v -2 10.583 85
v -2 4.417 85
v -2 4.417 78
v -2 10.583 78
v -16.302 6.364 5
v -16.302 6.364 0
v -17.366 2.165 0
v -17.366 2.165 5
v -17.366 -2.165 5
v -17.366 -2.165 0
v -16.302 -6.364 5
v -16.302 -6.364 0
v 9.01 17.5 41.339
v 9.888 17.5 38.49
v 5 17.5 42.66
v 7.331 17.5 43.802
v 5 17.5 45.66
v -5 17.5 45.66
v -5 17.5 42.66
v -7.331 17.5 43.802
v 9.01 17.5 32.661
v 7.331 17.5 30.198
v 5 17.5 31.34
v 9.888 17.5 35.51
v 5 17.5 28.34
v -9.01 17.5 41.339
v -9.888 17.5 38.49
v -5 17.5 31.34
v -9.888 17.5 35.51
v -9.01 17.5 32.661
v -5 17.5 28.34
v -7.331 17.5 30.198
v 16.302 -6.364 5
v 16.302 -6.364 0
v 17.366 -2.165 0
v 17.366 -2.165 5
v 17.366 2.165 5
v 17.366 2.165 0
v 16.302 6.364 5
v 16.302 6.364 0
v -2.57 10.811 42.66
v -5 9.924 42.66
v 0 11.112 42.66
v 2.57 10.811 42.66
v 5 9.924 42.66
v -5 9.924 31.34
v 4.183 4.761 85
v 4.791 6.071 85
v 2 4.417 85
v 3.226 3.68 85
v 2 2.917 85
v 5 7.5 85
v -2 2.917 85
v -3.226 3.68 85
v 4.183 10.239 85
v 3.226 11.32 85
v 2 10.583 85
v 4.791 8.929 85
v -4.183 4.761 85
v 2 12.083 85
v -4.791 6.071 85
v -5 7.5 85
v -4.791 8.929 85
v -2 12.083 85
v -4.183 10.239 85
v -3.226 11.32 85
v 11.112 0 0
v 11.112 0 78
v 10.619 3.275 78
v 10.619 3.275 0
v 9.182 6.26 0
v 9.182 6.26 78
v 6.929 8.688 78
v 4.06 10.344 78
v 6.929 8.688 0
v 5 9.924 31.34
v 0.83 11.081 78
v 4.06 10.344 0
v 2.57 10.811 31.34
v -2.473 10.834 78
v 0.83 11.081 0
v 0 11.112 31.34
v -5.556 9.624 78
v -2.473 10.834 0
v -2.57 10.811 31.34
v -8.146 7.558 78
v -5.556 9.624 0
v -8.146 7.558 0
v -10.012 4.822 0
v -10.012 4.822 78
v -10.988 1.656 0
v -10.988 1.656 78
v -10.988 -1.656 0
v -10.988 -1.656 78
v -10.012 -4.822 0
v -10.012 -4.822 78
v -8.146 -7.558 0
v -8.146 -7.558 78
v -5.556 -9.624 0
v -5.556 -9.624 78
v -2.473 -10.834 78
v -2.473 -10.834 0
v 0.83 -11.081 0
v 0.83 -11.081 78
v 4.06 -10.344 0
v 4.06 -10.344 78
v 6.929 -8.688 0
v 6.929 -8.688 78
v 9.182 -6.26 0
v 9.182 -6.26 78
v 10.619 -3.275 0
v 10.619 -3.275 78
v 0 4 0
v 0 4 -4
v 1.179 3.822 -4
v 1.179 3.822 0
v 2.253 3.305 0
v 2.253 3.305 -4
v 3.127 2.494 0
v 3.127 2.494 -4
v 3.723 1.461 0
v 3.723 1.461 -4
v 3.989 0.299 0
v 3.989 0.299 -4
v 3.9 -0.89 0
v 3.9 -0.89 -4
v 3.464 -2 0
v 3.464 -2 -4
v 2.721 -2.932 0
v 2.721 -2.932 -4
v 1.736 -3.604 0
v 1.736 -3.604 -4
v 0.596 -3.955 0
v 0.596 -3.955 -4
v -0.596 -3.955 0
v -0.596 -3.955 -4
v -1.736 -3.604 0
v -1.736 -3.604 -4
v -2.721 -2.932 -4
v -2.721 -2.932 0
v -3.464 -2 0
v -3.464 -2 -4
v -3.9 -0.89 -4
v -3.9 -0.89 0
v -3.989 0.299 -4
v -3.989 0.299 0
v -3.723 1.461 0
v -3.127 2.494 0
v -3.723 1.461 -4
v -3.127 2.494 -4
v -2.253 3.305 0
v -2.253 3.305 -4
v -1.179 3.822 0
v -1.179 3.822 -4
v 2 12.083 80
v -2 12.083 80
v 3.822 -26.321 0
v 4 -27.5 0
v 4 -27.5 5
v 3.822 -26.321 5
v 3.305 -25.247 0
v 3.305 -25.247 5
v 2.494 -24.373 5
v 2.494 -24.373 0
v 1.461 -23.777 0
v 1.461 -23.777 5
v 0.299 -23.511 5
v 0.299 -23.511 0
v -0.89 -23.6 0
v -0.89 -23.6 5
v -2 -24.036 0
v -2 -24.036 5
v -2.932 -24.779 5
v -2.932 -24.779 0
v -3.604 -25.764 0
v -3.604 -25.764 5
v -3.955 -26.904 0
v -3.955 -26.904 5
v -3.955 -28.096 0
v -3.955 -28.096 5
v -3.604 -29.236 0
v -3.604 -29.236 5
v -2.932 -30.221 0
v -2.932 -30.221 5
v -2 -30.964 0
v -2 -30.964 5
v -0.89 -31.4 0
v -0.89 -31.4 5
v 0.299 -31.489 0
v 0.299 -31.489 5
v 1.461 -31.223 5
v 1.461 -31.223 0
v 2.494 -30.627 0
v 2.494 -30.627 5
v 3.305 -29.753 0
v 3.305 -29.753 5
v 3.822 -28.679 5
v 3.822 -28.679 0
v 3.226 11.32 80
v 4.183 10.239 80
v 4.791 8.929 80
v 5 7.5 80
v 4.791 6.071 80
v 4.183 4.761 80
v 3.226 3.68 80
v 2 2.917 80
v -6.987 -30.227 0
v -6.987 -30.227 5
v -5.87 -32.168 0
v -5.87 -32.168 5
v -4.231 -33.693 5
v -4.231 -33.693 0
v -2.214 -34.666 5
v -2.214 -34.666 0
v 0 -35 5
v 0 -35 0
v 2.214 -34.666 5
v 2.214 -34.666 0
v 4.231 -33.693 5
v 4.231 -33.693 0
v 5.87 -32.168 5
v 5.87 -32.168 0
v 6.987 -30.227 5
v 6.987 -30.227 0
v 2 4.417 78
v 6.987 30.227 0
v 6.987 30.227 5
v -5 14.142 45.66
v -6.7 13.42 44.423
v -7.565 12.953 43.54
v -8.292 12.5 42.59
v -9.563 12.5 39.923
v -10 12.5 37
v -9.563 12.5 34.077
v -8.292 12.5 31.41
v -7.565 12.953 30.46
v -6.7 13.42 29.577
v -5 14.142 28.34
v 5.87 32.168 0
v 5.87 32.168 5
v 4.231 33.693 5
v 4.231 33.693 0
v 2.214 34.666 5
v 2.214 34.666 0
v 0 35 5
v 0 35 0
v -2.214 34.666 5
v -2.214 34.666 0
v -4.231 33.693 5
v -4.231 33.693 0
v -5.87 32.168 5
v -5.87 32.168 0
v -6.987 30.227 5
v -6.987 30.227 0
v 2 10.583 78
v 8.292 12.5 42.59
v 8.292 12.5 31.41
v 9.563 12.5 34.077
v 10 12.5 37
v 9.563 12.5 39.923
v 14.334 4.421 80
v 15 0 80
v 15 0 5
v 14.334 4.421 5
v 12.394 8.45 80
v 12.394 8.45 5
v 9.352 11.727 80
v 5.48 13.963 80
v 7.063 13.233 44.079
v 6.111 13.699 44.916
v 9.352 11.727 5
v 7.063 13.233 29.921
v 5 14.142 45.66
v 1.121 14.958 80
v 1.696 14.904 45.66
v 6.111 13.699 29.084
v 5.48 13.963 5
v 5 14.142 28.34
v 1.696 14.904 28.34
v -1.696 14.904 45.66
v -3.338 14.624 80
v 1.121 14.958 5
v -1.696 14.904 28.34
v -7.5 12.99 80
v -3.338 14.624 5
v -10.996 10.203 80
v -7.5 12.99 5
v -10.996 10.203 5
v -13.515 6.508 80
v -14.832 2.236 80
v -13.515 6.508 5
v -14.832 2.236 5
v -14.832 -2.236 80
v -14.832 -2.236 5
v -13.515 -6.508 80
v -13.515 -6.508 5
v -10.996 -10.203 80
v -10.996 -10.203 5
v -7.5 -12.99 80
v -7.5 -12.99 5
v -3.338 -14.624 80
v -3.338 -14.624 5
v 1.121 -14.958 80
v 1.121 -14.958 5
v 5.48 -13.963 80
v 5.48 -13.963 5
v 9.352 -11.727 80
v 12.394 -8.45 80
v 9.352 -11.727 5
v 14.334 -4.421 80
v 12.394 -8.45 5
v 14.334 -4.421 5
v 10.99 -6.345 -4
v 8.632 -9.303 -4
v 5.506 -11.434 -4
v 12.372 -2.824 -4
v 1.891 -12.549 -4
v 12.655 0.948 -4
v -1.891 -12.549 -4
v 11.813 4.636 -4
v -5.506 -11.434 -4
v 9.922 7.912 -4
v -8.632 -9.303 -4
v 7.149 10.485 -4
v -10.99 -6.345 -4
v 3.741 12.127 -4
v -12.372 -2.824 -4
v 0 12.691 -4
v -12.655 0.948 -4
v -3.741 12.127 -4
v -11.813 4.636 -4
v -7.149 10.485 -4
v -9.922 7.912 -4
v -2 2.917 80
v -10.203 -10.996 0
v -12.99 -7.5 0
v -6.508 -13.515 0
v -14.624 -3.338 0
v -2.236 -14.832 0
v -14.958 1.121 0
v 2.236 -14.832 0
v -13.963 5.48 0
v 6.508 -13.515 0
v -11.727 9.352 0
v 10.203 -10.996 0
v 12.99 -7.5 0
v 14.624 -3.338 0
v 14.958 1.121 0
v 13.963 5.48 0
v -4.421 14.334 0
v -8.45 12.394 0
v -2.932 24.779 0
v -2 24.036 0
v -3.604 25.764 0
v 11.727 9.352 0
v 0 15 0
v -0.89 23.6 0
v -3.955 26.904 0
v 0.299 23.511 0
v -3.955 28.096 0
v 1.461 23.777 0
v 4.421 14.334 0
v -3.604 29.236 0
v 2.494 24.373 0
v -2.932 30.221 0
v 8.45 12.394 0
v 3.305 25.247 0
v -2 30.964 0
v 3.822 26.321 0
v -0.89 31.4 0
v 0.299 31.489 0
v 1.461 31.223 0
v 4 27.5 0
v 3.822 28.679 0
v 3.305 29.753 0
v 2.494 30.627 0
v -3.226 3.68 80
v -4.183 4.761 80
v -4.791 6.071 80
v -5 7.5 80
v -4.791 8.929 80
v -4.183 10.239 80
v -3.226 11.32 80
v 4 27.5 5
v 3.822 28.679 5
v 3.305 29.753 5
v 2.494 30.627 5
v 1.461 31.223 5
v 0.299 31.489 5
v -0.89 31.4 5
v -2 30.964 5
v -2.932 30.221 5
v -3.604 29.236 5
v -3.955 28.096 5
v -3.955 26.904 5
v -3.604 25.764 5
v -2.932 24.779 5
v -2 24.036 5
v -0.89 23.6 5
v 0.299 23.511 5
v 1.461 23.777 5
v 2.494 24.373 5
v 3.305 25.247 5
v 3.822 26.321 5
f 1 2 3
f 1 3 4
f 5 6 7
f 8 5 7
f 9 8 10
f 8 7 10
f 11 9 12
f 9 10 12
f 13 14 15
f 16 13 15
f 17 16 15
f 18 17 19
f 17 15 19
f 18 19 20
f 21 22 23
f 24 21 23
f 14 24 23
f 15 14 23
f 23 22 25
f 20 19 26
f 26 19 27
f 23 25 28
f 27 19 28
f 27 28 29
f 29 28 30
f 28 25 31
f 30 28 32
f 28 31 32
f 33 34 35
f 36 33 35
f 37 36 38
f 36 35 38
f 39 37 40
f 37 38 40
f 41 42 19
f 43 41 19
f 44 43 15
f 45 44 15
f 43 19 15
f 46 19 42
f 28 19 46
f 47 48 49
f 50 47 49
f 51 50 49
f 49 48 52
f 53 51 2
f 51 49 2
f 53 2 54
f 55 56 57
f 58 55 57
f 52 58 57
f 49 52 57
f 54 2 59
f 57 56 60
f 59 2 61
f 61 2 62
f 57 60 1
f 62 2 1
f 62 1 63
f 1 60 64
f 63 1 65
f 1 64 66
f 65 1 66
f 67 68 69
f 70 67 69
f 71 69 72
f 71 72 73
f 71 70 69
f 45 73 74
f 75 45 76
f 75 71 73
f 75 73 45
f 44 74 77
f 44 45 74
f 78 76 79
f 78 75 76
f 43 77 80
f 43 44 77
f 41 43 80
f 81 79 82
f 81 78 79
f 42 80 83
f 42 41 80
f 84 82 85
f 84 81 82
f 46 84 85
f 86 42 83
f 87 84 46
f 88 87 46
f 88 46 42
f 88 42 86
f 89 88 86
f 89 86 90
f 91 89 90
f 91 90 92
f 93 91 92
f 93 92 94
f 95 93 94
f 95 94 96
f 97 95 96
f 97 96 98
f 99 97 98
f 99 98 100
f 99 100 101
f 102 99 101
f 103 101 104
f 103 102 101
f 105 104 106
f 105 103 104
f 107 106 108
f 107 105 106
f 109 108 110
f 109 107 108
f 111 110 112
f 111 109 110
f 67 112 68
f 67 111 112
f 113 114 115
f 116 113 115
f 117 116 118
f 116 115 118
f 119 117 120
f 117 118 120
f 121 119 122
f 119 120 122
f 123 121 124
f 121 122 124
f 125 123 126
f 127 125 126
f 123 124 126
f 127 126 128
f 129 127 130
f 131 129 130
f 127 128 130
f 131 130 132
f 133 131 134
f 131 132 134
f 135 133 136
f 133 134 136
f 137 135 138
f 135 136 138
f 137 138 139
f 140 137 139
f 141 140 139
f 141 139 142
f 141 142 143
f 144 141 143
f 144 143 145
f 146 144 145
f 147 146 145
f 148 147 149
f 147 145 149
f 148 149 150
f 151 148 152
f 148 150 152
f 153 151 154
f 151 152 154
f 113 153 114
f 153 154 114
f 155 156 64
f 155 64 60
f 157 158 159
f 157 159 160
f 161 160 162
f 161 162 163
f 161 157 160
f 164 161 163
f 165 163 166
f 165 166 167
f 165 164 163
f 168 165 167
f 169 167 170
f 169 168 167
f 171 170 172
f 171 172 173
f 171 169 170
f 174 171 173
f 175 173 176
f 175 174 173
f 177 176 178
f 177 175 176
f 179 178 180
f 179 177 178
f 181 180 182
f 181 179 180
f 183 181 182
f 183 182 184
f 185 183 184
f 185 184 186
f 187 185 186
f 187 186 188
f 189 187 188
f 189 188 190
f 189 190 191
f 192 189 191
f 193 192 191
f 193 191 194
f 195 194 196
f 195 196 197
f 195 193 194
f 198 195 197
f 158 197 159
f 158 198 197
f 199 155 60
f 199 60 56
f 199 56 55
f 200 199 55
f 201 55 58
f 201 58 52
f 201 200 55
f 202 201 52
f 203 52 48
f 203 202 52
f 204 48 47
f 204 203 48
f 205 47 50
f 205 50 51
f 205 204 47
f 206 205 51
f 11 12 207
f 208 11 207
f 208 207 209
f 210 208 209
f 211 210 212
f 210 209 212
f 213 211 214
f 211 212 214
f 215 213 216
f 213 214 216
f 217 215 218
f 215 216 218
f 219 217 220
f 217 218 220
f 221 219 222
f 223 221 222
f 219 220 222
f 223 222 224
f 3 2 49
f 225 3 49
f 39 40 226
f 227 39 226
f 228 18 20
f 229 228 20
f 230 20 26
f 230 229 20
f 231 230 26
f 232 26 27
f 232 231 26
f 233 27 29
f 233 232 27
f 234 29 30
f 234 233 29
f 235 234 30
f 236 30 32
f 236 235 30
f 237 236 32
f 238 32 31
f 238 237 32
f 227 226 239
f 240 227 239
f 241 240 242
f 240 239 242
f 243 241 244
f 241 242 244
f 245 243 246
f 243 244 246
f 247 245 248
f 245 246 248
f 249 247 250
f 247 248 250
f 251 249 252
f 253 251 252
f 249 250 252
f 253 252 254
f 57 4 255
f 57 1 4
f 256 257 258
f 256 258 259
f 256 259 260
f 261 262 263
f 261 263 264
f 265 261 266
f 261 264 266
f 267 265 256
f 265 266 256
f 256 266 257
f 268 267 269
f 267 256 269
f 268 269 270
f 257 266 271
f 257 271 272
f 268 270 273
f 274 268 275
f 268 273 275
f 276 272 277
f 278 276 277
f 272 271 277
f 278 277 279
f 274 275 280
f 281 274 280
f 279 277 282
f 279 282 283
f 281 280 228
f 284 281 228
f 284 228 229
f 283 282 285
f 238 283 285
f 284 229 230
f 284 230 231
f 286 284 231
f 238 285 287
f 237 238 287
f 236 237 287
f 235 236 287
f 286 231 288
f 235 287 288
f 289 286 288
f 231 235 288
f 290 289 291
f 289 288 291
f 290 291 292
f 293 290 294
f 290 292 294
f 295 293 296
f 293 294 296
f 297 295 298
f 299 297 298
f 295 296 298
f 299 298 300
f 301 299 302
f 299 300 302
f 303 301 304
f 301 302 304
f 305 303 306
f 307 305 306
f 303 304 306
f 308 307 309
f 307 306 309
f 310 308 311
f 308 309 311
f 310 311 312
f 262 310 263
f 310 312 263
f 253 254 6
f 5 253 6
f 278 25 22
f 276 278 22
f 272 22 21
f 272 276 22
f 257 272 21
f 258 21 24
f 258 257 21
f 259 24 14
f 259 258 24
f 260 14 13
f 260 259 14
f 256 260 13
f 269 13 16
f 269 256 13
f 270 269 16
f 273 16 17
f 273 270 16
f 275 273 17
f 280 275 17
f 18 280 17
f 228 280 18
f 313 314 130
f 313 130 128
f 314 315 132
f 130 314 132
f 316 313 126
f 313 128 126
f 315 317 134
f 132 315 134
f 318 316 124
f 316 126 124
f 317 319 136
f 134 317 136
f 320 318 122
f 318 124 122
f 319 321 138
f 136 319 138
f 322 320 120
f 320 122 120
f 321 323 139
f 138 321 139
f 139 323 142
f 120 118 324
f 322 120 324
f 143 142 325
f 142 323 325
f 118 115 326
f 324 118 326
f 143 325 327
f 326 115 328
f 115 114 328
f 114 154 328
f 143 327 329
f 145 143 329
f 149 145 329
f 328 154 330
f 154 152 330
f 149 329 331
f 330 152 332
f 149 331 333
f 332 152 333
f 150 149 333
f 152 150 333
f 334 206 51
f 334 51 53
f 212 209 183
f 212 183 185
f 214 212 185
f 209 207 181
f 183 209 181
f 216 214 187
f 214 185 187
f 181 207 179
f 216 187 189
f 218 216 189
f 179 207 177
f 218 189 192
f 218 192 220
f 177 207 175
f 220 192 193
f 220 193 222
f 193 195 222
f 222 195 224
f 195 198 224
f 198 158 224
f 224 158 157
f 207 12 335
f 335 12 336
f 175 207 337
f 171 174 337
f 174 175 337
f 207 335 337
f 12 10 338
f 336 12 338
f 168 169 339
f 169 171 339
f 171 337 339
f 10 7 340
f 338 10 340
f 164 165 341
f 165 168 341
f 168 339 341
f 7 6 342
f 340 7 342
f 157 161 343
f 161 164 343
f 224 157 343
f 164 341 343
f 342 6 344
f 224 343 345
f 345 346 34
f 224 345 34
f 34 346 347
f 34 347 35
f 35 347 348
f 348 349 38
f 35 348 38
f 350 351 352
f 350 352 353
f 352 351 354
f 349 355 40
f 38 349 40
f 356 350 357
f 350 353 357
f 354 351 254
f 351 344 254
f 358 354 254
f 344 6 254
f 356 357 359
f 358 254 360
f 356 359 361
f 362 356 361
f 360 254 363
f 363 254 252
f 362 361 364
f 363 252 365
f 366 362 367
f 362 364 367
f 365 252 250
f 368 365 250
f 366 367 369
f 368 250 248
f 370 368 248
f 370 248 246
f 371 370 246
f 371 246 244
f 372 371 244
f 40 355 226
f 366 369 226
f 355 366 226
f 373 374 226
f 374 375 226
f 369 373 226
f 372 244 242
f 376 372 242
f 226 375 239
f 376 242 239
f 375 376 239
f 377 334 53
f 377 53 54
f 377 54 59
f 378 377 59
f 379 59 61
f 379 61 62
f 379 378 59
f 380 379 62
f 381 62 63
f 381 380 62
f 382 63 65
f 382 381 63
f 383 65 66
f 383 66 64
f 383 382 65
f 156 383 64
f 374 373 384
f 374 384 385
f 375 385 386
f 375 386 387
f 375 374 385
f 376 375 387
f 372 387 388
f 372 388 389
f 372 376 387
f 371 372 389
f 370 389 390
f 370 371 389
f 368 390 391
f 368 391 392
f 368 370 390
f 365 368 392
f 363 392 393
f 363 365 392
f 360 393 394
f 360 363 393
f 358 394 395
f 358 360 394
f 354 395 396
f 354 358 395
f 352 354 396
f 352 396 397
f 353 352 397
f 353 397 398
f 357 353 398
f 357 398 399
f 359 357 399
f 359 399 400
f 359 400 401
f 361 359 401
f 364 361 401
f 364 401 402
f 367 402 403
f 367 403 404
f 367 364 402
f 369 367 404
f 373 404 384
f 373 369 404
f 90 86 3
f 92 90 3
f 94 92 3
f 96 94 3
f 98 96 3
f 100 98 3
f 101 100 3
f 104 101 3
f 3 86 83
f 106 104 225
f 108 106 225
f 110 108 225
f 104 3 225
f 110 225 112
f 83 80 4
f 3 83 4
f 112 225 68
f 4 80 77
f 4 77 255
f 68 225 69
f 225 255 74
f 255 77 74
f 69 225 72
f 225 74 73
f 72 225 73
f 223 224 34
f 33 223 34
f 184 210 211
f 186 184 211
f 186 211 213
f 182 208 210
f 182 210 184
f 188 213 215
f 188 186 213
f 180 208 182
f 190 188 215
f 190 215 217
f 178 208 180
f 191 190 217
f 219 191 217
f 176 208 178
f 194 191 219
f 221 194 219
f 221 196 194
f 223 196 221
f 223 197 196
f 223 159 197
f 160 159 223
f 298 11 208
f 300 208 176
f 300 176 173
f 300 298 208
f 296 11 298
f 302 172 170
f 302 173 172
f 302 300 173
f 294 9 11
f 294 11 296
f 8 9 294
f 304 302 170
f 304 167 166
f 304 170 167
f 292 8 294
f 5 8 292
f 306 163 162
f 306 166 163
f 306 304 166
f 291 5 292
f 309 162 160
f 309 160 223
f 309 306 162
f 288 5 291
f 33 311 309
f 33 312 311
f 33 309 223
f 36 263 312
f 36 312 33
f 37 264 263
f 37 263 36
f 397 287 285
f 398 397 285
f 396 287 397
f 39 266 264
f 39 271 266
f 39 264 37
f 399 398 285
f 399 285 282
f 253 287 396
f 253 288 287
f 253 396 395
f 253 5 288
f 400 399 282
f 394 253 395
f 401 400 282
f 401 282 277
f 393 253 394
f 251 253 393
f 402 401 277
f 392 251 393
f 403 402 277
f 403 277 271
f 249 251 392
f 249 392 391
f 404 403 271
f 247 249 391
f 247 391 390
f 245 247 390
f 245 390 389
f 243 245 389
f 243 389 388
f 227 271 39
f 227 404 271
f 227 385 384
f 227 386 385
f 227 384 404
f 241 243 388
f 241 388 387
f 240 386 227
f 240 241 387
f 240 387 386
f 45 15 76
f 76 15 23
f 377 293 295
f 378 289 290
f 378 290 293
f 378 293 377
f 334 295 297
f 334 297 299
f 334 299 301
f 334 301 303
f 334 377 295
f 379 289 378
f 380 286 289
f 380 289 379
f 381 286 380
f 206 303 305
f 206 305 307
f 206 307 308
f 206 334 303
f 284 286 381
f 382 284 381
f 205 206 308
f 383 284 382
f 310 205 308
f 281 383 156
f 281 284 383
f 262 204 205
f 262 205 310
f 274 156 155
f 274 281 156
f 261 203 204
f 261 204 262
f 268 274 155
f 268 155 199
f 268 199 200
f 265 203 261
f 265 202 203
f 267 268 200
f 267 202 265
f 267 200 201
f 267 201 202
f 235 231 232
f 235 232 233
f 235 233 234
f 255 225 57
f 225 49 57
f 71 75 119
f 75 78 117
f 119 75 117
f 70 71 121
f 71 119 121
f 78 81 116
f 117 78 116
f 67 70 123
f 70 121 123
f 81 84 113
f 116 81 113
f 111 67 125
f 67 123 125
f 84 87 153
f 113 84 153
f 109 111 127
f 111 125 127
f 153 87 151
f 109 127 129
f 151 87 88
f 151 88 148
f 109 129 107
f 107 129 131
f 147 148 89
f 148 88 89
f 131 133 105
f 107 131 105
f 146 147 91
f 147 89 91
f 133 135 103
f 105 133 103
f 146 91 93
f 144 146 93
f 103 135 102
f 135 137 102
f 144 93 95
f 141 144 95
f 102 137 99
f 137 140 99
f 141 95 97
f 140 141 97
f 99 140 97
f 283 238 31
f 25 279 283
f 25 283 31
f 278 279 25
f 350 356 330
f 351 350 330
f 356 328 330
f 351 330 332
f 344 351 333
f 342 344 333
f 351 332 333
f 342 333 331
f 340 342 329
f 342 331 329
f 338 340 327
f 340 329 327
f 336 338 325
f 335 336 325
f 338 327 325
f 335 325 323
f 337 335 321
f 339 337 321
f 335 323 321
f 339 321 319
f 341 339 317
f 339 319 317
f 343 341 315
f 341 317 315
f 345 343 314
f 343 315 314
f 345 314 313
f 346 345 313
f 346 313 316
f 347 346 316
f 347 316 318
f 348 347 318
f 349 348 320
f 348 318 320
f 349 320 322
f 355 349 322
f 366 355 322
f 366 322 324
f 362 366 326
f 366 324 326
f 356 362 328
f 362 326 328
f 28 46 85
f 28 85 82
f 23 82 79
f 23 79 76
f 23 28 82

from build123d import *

# Parameters (mm, degrees)
SKETCH1_R           = 15
SKETCH1_R_2         = 4
BOSS_EXTRUDE1_DEPTH = 5
SKETCH3_R           = 15
SKETCH3_R_2         = 11.1125
BOSS_EXTRUDE2_DEPTH = 80
BOSS_EXTRUDE3_START = -2
SKETCH4_R           = 11.1125
BOSS_EXTRUDE3_DEPTH = 2
SKETCH5_W           = 4
SKETCH5_H           = 6.16515139
BOSS_EXTRUDE4_DEPTH = 5
SKETCH6_W           = 10
SKETCH6_H           = 11.320508076
BOSS_EXTRUDE5_DEPTH = 5
SKETCH8_R           = 4
CUT_EXTRUDE1_DEPTH  = 4
SKETCH10_W          = 4
SKETCH10_H          = 6.16515139
CUT_EXTRUDE2_DEPTH  = 2
SKETCH11_W          = 10
SKETCH11_H          = 11.320508076
CUT_EXTRUDE3_DEPTH  = 18.5


with BuildPart() as part:
    # Sketch1 → Boss-Extrude1 (new body)
    with BuildSketch(Plane.XY):
        with BuildLine():
            Line((-16.301967128, -6.363636364), (-6.98655734, -30.227272727))
            ThreePointArc((-6.98655734, -30.227272727), (0, -35), (6.98655734, -30.227272727))
            Line((6.98655734, -30.227272727), (16.301967128, -6.363636364))
            ThreePointArc((16.301967128, -6.363636364), (17.5, 0), (16.301967128, 6.363636364))
            Line((16.301967128, 6.363636364), (6.98655734, 30.227272727))
            ThreePointArc((6.98655734, 30.227272727), (0, 35), (-6.98655734, 30.227272727))
            Line((-6.98655734, 30.227272727), (-16.301967128, 6.363636364))
            ThreePointArc((-16.301967128, 6.363636364), (-17.5, 0), (-16.301967128, -6.363636364))
        make_face()
        Circle(SKETCH1_R, mode=Mode.SUBTRACT)
        with Locations((0, 27.5)):
            Circle(SKETCH1_R_2, mode=Mode.SUBTRACT)
        with Locations((0, -27.5)):
            Circle(SKETCH1_R_2, mode=Mode.SUBTRACT)
    extrude(amount=BOSS_EXTRUDE1_DEPTH)

    # Sketch3 → Boss-Extrude2 (add)
    with BuildSketch(Plane.XY):
        Circle(SKETCH3_R)
        Circle(SKETCH3_R_2, mode=Mode.SUBTRACT)
    extrude(amount=BOSS_EXTRUDE2_DEPTH)

    # Sketch4 → Boss-Extrude3 (add)
    with BuildSketch(Plane.XY.offset(80).offset(BOSS_EXTRUDE3_START)):
        Circle(SKETCH4_R)
    extrude(amount=BOSS_EXTRUDE3_DEPTH)

    # Sketch5 → Boss-Extrude4 (add)
    with BuildSketch(Plane.XY.offset(80)):
        with BuildLine():
            Line((-2, 12.082575695), (2, 12.082575695))
            ThreePointArc((2, 12.082575695), (5, 7.5), (2, 2.917424305))
            Line((2, 2.917424305), (-2, 2.917424305))
            ThreePointArc((-2, 2.917424305), (-5, 7.5), (-2, 12.082575695))
        make_face()
        with Locations((0, 7.5)):
            Rectangle(SKETCH5_W, SKETCH5_H, mode=Mode.SUBTRACT)
    extrude(amount=BOSS_EXTRUDE4_DEPTH)

    # Sketch6 → Boss-Extrude5 (add)
    with BuildSketch(Plane(origin=(0, 12.5, 0), x_dir=(1, 0, 0), z_dir=(0, 1, 0))):
        with BuildLine():
            Line((-5, -28.339745962), (5, -28.339745962))
            ThreePointArc((5, -28.339745962), (10, -37), (5, -45.660254038))
            Line((5, -45.660254038), (-5, -45.660254038))
            ThreePointArc((-5, -45.660254038), (-10, -37), (-5, -28.339745962))
        make_face()
        with Locations((0, -37)):
            Rectangle(SKETCH6_W, SKETCH6_H, mode=Mode.SUBTRACT)
    extrude(amount=BOSS_EXTRUDE5_DEPTH)

    # Sketch7 → Revolve1 (revolve)
    with BuildSketch(Plane(origin=(0, 0, 0), x_dir=(0, 0, -1), z_dir=(1, 0, 0))):
        Polygon((0, 15), (4, 12.690598923), (4, 0), (0, 0), align=None)
    revolve(axis=Axis((0, 0, -4), (0, 0, 1)))

    # Sketch8 → Cut-Extrude1 (cut)
    with BuildSketch(Plane(origin=(0, 0, -4), x_dir=(-1, 0, 0), z_dir=(0, 0, -1))):
        with Locations(Location((0, 0, 0), (0, 0, 90))):
            Circle(SKETCH8_R)
    extrude(amount=-CUT_EXTRUDE1_DEPTH, mode=Mode.SUBTRACT)

    # Sketch10 → Cut-Extrude2 (cut)
    with BuildSketch(Plane.XY.offset(80)):
        with Locations((0, 7.5)):
            Rectangle(SKETCH10_W, SKETCH10_H)
    extrude(amount=-CUT_EXTRUDE2_DEPTH, mode=Mode.SUBTRACT)

    # Sketch11 → Cut-Extrude3 (cut, symmetric)
    with BuildSketch(Plane(origin=(0, 12.5, 0), x_dir=(1, 0, 0), z_dir=(0, 1, 0))):
        with Locations((0, -37)):
            Rectangle(SKETCH11_W, SKETCH11_H)
    extrude(amount=CUT_EXTRUDE3_DEPTH, both=True, mode=Mode.SUBTRACT)


solid = part.part
